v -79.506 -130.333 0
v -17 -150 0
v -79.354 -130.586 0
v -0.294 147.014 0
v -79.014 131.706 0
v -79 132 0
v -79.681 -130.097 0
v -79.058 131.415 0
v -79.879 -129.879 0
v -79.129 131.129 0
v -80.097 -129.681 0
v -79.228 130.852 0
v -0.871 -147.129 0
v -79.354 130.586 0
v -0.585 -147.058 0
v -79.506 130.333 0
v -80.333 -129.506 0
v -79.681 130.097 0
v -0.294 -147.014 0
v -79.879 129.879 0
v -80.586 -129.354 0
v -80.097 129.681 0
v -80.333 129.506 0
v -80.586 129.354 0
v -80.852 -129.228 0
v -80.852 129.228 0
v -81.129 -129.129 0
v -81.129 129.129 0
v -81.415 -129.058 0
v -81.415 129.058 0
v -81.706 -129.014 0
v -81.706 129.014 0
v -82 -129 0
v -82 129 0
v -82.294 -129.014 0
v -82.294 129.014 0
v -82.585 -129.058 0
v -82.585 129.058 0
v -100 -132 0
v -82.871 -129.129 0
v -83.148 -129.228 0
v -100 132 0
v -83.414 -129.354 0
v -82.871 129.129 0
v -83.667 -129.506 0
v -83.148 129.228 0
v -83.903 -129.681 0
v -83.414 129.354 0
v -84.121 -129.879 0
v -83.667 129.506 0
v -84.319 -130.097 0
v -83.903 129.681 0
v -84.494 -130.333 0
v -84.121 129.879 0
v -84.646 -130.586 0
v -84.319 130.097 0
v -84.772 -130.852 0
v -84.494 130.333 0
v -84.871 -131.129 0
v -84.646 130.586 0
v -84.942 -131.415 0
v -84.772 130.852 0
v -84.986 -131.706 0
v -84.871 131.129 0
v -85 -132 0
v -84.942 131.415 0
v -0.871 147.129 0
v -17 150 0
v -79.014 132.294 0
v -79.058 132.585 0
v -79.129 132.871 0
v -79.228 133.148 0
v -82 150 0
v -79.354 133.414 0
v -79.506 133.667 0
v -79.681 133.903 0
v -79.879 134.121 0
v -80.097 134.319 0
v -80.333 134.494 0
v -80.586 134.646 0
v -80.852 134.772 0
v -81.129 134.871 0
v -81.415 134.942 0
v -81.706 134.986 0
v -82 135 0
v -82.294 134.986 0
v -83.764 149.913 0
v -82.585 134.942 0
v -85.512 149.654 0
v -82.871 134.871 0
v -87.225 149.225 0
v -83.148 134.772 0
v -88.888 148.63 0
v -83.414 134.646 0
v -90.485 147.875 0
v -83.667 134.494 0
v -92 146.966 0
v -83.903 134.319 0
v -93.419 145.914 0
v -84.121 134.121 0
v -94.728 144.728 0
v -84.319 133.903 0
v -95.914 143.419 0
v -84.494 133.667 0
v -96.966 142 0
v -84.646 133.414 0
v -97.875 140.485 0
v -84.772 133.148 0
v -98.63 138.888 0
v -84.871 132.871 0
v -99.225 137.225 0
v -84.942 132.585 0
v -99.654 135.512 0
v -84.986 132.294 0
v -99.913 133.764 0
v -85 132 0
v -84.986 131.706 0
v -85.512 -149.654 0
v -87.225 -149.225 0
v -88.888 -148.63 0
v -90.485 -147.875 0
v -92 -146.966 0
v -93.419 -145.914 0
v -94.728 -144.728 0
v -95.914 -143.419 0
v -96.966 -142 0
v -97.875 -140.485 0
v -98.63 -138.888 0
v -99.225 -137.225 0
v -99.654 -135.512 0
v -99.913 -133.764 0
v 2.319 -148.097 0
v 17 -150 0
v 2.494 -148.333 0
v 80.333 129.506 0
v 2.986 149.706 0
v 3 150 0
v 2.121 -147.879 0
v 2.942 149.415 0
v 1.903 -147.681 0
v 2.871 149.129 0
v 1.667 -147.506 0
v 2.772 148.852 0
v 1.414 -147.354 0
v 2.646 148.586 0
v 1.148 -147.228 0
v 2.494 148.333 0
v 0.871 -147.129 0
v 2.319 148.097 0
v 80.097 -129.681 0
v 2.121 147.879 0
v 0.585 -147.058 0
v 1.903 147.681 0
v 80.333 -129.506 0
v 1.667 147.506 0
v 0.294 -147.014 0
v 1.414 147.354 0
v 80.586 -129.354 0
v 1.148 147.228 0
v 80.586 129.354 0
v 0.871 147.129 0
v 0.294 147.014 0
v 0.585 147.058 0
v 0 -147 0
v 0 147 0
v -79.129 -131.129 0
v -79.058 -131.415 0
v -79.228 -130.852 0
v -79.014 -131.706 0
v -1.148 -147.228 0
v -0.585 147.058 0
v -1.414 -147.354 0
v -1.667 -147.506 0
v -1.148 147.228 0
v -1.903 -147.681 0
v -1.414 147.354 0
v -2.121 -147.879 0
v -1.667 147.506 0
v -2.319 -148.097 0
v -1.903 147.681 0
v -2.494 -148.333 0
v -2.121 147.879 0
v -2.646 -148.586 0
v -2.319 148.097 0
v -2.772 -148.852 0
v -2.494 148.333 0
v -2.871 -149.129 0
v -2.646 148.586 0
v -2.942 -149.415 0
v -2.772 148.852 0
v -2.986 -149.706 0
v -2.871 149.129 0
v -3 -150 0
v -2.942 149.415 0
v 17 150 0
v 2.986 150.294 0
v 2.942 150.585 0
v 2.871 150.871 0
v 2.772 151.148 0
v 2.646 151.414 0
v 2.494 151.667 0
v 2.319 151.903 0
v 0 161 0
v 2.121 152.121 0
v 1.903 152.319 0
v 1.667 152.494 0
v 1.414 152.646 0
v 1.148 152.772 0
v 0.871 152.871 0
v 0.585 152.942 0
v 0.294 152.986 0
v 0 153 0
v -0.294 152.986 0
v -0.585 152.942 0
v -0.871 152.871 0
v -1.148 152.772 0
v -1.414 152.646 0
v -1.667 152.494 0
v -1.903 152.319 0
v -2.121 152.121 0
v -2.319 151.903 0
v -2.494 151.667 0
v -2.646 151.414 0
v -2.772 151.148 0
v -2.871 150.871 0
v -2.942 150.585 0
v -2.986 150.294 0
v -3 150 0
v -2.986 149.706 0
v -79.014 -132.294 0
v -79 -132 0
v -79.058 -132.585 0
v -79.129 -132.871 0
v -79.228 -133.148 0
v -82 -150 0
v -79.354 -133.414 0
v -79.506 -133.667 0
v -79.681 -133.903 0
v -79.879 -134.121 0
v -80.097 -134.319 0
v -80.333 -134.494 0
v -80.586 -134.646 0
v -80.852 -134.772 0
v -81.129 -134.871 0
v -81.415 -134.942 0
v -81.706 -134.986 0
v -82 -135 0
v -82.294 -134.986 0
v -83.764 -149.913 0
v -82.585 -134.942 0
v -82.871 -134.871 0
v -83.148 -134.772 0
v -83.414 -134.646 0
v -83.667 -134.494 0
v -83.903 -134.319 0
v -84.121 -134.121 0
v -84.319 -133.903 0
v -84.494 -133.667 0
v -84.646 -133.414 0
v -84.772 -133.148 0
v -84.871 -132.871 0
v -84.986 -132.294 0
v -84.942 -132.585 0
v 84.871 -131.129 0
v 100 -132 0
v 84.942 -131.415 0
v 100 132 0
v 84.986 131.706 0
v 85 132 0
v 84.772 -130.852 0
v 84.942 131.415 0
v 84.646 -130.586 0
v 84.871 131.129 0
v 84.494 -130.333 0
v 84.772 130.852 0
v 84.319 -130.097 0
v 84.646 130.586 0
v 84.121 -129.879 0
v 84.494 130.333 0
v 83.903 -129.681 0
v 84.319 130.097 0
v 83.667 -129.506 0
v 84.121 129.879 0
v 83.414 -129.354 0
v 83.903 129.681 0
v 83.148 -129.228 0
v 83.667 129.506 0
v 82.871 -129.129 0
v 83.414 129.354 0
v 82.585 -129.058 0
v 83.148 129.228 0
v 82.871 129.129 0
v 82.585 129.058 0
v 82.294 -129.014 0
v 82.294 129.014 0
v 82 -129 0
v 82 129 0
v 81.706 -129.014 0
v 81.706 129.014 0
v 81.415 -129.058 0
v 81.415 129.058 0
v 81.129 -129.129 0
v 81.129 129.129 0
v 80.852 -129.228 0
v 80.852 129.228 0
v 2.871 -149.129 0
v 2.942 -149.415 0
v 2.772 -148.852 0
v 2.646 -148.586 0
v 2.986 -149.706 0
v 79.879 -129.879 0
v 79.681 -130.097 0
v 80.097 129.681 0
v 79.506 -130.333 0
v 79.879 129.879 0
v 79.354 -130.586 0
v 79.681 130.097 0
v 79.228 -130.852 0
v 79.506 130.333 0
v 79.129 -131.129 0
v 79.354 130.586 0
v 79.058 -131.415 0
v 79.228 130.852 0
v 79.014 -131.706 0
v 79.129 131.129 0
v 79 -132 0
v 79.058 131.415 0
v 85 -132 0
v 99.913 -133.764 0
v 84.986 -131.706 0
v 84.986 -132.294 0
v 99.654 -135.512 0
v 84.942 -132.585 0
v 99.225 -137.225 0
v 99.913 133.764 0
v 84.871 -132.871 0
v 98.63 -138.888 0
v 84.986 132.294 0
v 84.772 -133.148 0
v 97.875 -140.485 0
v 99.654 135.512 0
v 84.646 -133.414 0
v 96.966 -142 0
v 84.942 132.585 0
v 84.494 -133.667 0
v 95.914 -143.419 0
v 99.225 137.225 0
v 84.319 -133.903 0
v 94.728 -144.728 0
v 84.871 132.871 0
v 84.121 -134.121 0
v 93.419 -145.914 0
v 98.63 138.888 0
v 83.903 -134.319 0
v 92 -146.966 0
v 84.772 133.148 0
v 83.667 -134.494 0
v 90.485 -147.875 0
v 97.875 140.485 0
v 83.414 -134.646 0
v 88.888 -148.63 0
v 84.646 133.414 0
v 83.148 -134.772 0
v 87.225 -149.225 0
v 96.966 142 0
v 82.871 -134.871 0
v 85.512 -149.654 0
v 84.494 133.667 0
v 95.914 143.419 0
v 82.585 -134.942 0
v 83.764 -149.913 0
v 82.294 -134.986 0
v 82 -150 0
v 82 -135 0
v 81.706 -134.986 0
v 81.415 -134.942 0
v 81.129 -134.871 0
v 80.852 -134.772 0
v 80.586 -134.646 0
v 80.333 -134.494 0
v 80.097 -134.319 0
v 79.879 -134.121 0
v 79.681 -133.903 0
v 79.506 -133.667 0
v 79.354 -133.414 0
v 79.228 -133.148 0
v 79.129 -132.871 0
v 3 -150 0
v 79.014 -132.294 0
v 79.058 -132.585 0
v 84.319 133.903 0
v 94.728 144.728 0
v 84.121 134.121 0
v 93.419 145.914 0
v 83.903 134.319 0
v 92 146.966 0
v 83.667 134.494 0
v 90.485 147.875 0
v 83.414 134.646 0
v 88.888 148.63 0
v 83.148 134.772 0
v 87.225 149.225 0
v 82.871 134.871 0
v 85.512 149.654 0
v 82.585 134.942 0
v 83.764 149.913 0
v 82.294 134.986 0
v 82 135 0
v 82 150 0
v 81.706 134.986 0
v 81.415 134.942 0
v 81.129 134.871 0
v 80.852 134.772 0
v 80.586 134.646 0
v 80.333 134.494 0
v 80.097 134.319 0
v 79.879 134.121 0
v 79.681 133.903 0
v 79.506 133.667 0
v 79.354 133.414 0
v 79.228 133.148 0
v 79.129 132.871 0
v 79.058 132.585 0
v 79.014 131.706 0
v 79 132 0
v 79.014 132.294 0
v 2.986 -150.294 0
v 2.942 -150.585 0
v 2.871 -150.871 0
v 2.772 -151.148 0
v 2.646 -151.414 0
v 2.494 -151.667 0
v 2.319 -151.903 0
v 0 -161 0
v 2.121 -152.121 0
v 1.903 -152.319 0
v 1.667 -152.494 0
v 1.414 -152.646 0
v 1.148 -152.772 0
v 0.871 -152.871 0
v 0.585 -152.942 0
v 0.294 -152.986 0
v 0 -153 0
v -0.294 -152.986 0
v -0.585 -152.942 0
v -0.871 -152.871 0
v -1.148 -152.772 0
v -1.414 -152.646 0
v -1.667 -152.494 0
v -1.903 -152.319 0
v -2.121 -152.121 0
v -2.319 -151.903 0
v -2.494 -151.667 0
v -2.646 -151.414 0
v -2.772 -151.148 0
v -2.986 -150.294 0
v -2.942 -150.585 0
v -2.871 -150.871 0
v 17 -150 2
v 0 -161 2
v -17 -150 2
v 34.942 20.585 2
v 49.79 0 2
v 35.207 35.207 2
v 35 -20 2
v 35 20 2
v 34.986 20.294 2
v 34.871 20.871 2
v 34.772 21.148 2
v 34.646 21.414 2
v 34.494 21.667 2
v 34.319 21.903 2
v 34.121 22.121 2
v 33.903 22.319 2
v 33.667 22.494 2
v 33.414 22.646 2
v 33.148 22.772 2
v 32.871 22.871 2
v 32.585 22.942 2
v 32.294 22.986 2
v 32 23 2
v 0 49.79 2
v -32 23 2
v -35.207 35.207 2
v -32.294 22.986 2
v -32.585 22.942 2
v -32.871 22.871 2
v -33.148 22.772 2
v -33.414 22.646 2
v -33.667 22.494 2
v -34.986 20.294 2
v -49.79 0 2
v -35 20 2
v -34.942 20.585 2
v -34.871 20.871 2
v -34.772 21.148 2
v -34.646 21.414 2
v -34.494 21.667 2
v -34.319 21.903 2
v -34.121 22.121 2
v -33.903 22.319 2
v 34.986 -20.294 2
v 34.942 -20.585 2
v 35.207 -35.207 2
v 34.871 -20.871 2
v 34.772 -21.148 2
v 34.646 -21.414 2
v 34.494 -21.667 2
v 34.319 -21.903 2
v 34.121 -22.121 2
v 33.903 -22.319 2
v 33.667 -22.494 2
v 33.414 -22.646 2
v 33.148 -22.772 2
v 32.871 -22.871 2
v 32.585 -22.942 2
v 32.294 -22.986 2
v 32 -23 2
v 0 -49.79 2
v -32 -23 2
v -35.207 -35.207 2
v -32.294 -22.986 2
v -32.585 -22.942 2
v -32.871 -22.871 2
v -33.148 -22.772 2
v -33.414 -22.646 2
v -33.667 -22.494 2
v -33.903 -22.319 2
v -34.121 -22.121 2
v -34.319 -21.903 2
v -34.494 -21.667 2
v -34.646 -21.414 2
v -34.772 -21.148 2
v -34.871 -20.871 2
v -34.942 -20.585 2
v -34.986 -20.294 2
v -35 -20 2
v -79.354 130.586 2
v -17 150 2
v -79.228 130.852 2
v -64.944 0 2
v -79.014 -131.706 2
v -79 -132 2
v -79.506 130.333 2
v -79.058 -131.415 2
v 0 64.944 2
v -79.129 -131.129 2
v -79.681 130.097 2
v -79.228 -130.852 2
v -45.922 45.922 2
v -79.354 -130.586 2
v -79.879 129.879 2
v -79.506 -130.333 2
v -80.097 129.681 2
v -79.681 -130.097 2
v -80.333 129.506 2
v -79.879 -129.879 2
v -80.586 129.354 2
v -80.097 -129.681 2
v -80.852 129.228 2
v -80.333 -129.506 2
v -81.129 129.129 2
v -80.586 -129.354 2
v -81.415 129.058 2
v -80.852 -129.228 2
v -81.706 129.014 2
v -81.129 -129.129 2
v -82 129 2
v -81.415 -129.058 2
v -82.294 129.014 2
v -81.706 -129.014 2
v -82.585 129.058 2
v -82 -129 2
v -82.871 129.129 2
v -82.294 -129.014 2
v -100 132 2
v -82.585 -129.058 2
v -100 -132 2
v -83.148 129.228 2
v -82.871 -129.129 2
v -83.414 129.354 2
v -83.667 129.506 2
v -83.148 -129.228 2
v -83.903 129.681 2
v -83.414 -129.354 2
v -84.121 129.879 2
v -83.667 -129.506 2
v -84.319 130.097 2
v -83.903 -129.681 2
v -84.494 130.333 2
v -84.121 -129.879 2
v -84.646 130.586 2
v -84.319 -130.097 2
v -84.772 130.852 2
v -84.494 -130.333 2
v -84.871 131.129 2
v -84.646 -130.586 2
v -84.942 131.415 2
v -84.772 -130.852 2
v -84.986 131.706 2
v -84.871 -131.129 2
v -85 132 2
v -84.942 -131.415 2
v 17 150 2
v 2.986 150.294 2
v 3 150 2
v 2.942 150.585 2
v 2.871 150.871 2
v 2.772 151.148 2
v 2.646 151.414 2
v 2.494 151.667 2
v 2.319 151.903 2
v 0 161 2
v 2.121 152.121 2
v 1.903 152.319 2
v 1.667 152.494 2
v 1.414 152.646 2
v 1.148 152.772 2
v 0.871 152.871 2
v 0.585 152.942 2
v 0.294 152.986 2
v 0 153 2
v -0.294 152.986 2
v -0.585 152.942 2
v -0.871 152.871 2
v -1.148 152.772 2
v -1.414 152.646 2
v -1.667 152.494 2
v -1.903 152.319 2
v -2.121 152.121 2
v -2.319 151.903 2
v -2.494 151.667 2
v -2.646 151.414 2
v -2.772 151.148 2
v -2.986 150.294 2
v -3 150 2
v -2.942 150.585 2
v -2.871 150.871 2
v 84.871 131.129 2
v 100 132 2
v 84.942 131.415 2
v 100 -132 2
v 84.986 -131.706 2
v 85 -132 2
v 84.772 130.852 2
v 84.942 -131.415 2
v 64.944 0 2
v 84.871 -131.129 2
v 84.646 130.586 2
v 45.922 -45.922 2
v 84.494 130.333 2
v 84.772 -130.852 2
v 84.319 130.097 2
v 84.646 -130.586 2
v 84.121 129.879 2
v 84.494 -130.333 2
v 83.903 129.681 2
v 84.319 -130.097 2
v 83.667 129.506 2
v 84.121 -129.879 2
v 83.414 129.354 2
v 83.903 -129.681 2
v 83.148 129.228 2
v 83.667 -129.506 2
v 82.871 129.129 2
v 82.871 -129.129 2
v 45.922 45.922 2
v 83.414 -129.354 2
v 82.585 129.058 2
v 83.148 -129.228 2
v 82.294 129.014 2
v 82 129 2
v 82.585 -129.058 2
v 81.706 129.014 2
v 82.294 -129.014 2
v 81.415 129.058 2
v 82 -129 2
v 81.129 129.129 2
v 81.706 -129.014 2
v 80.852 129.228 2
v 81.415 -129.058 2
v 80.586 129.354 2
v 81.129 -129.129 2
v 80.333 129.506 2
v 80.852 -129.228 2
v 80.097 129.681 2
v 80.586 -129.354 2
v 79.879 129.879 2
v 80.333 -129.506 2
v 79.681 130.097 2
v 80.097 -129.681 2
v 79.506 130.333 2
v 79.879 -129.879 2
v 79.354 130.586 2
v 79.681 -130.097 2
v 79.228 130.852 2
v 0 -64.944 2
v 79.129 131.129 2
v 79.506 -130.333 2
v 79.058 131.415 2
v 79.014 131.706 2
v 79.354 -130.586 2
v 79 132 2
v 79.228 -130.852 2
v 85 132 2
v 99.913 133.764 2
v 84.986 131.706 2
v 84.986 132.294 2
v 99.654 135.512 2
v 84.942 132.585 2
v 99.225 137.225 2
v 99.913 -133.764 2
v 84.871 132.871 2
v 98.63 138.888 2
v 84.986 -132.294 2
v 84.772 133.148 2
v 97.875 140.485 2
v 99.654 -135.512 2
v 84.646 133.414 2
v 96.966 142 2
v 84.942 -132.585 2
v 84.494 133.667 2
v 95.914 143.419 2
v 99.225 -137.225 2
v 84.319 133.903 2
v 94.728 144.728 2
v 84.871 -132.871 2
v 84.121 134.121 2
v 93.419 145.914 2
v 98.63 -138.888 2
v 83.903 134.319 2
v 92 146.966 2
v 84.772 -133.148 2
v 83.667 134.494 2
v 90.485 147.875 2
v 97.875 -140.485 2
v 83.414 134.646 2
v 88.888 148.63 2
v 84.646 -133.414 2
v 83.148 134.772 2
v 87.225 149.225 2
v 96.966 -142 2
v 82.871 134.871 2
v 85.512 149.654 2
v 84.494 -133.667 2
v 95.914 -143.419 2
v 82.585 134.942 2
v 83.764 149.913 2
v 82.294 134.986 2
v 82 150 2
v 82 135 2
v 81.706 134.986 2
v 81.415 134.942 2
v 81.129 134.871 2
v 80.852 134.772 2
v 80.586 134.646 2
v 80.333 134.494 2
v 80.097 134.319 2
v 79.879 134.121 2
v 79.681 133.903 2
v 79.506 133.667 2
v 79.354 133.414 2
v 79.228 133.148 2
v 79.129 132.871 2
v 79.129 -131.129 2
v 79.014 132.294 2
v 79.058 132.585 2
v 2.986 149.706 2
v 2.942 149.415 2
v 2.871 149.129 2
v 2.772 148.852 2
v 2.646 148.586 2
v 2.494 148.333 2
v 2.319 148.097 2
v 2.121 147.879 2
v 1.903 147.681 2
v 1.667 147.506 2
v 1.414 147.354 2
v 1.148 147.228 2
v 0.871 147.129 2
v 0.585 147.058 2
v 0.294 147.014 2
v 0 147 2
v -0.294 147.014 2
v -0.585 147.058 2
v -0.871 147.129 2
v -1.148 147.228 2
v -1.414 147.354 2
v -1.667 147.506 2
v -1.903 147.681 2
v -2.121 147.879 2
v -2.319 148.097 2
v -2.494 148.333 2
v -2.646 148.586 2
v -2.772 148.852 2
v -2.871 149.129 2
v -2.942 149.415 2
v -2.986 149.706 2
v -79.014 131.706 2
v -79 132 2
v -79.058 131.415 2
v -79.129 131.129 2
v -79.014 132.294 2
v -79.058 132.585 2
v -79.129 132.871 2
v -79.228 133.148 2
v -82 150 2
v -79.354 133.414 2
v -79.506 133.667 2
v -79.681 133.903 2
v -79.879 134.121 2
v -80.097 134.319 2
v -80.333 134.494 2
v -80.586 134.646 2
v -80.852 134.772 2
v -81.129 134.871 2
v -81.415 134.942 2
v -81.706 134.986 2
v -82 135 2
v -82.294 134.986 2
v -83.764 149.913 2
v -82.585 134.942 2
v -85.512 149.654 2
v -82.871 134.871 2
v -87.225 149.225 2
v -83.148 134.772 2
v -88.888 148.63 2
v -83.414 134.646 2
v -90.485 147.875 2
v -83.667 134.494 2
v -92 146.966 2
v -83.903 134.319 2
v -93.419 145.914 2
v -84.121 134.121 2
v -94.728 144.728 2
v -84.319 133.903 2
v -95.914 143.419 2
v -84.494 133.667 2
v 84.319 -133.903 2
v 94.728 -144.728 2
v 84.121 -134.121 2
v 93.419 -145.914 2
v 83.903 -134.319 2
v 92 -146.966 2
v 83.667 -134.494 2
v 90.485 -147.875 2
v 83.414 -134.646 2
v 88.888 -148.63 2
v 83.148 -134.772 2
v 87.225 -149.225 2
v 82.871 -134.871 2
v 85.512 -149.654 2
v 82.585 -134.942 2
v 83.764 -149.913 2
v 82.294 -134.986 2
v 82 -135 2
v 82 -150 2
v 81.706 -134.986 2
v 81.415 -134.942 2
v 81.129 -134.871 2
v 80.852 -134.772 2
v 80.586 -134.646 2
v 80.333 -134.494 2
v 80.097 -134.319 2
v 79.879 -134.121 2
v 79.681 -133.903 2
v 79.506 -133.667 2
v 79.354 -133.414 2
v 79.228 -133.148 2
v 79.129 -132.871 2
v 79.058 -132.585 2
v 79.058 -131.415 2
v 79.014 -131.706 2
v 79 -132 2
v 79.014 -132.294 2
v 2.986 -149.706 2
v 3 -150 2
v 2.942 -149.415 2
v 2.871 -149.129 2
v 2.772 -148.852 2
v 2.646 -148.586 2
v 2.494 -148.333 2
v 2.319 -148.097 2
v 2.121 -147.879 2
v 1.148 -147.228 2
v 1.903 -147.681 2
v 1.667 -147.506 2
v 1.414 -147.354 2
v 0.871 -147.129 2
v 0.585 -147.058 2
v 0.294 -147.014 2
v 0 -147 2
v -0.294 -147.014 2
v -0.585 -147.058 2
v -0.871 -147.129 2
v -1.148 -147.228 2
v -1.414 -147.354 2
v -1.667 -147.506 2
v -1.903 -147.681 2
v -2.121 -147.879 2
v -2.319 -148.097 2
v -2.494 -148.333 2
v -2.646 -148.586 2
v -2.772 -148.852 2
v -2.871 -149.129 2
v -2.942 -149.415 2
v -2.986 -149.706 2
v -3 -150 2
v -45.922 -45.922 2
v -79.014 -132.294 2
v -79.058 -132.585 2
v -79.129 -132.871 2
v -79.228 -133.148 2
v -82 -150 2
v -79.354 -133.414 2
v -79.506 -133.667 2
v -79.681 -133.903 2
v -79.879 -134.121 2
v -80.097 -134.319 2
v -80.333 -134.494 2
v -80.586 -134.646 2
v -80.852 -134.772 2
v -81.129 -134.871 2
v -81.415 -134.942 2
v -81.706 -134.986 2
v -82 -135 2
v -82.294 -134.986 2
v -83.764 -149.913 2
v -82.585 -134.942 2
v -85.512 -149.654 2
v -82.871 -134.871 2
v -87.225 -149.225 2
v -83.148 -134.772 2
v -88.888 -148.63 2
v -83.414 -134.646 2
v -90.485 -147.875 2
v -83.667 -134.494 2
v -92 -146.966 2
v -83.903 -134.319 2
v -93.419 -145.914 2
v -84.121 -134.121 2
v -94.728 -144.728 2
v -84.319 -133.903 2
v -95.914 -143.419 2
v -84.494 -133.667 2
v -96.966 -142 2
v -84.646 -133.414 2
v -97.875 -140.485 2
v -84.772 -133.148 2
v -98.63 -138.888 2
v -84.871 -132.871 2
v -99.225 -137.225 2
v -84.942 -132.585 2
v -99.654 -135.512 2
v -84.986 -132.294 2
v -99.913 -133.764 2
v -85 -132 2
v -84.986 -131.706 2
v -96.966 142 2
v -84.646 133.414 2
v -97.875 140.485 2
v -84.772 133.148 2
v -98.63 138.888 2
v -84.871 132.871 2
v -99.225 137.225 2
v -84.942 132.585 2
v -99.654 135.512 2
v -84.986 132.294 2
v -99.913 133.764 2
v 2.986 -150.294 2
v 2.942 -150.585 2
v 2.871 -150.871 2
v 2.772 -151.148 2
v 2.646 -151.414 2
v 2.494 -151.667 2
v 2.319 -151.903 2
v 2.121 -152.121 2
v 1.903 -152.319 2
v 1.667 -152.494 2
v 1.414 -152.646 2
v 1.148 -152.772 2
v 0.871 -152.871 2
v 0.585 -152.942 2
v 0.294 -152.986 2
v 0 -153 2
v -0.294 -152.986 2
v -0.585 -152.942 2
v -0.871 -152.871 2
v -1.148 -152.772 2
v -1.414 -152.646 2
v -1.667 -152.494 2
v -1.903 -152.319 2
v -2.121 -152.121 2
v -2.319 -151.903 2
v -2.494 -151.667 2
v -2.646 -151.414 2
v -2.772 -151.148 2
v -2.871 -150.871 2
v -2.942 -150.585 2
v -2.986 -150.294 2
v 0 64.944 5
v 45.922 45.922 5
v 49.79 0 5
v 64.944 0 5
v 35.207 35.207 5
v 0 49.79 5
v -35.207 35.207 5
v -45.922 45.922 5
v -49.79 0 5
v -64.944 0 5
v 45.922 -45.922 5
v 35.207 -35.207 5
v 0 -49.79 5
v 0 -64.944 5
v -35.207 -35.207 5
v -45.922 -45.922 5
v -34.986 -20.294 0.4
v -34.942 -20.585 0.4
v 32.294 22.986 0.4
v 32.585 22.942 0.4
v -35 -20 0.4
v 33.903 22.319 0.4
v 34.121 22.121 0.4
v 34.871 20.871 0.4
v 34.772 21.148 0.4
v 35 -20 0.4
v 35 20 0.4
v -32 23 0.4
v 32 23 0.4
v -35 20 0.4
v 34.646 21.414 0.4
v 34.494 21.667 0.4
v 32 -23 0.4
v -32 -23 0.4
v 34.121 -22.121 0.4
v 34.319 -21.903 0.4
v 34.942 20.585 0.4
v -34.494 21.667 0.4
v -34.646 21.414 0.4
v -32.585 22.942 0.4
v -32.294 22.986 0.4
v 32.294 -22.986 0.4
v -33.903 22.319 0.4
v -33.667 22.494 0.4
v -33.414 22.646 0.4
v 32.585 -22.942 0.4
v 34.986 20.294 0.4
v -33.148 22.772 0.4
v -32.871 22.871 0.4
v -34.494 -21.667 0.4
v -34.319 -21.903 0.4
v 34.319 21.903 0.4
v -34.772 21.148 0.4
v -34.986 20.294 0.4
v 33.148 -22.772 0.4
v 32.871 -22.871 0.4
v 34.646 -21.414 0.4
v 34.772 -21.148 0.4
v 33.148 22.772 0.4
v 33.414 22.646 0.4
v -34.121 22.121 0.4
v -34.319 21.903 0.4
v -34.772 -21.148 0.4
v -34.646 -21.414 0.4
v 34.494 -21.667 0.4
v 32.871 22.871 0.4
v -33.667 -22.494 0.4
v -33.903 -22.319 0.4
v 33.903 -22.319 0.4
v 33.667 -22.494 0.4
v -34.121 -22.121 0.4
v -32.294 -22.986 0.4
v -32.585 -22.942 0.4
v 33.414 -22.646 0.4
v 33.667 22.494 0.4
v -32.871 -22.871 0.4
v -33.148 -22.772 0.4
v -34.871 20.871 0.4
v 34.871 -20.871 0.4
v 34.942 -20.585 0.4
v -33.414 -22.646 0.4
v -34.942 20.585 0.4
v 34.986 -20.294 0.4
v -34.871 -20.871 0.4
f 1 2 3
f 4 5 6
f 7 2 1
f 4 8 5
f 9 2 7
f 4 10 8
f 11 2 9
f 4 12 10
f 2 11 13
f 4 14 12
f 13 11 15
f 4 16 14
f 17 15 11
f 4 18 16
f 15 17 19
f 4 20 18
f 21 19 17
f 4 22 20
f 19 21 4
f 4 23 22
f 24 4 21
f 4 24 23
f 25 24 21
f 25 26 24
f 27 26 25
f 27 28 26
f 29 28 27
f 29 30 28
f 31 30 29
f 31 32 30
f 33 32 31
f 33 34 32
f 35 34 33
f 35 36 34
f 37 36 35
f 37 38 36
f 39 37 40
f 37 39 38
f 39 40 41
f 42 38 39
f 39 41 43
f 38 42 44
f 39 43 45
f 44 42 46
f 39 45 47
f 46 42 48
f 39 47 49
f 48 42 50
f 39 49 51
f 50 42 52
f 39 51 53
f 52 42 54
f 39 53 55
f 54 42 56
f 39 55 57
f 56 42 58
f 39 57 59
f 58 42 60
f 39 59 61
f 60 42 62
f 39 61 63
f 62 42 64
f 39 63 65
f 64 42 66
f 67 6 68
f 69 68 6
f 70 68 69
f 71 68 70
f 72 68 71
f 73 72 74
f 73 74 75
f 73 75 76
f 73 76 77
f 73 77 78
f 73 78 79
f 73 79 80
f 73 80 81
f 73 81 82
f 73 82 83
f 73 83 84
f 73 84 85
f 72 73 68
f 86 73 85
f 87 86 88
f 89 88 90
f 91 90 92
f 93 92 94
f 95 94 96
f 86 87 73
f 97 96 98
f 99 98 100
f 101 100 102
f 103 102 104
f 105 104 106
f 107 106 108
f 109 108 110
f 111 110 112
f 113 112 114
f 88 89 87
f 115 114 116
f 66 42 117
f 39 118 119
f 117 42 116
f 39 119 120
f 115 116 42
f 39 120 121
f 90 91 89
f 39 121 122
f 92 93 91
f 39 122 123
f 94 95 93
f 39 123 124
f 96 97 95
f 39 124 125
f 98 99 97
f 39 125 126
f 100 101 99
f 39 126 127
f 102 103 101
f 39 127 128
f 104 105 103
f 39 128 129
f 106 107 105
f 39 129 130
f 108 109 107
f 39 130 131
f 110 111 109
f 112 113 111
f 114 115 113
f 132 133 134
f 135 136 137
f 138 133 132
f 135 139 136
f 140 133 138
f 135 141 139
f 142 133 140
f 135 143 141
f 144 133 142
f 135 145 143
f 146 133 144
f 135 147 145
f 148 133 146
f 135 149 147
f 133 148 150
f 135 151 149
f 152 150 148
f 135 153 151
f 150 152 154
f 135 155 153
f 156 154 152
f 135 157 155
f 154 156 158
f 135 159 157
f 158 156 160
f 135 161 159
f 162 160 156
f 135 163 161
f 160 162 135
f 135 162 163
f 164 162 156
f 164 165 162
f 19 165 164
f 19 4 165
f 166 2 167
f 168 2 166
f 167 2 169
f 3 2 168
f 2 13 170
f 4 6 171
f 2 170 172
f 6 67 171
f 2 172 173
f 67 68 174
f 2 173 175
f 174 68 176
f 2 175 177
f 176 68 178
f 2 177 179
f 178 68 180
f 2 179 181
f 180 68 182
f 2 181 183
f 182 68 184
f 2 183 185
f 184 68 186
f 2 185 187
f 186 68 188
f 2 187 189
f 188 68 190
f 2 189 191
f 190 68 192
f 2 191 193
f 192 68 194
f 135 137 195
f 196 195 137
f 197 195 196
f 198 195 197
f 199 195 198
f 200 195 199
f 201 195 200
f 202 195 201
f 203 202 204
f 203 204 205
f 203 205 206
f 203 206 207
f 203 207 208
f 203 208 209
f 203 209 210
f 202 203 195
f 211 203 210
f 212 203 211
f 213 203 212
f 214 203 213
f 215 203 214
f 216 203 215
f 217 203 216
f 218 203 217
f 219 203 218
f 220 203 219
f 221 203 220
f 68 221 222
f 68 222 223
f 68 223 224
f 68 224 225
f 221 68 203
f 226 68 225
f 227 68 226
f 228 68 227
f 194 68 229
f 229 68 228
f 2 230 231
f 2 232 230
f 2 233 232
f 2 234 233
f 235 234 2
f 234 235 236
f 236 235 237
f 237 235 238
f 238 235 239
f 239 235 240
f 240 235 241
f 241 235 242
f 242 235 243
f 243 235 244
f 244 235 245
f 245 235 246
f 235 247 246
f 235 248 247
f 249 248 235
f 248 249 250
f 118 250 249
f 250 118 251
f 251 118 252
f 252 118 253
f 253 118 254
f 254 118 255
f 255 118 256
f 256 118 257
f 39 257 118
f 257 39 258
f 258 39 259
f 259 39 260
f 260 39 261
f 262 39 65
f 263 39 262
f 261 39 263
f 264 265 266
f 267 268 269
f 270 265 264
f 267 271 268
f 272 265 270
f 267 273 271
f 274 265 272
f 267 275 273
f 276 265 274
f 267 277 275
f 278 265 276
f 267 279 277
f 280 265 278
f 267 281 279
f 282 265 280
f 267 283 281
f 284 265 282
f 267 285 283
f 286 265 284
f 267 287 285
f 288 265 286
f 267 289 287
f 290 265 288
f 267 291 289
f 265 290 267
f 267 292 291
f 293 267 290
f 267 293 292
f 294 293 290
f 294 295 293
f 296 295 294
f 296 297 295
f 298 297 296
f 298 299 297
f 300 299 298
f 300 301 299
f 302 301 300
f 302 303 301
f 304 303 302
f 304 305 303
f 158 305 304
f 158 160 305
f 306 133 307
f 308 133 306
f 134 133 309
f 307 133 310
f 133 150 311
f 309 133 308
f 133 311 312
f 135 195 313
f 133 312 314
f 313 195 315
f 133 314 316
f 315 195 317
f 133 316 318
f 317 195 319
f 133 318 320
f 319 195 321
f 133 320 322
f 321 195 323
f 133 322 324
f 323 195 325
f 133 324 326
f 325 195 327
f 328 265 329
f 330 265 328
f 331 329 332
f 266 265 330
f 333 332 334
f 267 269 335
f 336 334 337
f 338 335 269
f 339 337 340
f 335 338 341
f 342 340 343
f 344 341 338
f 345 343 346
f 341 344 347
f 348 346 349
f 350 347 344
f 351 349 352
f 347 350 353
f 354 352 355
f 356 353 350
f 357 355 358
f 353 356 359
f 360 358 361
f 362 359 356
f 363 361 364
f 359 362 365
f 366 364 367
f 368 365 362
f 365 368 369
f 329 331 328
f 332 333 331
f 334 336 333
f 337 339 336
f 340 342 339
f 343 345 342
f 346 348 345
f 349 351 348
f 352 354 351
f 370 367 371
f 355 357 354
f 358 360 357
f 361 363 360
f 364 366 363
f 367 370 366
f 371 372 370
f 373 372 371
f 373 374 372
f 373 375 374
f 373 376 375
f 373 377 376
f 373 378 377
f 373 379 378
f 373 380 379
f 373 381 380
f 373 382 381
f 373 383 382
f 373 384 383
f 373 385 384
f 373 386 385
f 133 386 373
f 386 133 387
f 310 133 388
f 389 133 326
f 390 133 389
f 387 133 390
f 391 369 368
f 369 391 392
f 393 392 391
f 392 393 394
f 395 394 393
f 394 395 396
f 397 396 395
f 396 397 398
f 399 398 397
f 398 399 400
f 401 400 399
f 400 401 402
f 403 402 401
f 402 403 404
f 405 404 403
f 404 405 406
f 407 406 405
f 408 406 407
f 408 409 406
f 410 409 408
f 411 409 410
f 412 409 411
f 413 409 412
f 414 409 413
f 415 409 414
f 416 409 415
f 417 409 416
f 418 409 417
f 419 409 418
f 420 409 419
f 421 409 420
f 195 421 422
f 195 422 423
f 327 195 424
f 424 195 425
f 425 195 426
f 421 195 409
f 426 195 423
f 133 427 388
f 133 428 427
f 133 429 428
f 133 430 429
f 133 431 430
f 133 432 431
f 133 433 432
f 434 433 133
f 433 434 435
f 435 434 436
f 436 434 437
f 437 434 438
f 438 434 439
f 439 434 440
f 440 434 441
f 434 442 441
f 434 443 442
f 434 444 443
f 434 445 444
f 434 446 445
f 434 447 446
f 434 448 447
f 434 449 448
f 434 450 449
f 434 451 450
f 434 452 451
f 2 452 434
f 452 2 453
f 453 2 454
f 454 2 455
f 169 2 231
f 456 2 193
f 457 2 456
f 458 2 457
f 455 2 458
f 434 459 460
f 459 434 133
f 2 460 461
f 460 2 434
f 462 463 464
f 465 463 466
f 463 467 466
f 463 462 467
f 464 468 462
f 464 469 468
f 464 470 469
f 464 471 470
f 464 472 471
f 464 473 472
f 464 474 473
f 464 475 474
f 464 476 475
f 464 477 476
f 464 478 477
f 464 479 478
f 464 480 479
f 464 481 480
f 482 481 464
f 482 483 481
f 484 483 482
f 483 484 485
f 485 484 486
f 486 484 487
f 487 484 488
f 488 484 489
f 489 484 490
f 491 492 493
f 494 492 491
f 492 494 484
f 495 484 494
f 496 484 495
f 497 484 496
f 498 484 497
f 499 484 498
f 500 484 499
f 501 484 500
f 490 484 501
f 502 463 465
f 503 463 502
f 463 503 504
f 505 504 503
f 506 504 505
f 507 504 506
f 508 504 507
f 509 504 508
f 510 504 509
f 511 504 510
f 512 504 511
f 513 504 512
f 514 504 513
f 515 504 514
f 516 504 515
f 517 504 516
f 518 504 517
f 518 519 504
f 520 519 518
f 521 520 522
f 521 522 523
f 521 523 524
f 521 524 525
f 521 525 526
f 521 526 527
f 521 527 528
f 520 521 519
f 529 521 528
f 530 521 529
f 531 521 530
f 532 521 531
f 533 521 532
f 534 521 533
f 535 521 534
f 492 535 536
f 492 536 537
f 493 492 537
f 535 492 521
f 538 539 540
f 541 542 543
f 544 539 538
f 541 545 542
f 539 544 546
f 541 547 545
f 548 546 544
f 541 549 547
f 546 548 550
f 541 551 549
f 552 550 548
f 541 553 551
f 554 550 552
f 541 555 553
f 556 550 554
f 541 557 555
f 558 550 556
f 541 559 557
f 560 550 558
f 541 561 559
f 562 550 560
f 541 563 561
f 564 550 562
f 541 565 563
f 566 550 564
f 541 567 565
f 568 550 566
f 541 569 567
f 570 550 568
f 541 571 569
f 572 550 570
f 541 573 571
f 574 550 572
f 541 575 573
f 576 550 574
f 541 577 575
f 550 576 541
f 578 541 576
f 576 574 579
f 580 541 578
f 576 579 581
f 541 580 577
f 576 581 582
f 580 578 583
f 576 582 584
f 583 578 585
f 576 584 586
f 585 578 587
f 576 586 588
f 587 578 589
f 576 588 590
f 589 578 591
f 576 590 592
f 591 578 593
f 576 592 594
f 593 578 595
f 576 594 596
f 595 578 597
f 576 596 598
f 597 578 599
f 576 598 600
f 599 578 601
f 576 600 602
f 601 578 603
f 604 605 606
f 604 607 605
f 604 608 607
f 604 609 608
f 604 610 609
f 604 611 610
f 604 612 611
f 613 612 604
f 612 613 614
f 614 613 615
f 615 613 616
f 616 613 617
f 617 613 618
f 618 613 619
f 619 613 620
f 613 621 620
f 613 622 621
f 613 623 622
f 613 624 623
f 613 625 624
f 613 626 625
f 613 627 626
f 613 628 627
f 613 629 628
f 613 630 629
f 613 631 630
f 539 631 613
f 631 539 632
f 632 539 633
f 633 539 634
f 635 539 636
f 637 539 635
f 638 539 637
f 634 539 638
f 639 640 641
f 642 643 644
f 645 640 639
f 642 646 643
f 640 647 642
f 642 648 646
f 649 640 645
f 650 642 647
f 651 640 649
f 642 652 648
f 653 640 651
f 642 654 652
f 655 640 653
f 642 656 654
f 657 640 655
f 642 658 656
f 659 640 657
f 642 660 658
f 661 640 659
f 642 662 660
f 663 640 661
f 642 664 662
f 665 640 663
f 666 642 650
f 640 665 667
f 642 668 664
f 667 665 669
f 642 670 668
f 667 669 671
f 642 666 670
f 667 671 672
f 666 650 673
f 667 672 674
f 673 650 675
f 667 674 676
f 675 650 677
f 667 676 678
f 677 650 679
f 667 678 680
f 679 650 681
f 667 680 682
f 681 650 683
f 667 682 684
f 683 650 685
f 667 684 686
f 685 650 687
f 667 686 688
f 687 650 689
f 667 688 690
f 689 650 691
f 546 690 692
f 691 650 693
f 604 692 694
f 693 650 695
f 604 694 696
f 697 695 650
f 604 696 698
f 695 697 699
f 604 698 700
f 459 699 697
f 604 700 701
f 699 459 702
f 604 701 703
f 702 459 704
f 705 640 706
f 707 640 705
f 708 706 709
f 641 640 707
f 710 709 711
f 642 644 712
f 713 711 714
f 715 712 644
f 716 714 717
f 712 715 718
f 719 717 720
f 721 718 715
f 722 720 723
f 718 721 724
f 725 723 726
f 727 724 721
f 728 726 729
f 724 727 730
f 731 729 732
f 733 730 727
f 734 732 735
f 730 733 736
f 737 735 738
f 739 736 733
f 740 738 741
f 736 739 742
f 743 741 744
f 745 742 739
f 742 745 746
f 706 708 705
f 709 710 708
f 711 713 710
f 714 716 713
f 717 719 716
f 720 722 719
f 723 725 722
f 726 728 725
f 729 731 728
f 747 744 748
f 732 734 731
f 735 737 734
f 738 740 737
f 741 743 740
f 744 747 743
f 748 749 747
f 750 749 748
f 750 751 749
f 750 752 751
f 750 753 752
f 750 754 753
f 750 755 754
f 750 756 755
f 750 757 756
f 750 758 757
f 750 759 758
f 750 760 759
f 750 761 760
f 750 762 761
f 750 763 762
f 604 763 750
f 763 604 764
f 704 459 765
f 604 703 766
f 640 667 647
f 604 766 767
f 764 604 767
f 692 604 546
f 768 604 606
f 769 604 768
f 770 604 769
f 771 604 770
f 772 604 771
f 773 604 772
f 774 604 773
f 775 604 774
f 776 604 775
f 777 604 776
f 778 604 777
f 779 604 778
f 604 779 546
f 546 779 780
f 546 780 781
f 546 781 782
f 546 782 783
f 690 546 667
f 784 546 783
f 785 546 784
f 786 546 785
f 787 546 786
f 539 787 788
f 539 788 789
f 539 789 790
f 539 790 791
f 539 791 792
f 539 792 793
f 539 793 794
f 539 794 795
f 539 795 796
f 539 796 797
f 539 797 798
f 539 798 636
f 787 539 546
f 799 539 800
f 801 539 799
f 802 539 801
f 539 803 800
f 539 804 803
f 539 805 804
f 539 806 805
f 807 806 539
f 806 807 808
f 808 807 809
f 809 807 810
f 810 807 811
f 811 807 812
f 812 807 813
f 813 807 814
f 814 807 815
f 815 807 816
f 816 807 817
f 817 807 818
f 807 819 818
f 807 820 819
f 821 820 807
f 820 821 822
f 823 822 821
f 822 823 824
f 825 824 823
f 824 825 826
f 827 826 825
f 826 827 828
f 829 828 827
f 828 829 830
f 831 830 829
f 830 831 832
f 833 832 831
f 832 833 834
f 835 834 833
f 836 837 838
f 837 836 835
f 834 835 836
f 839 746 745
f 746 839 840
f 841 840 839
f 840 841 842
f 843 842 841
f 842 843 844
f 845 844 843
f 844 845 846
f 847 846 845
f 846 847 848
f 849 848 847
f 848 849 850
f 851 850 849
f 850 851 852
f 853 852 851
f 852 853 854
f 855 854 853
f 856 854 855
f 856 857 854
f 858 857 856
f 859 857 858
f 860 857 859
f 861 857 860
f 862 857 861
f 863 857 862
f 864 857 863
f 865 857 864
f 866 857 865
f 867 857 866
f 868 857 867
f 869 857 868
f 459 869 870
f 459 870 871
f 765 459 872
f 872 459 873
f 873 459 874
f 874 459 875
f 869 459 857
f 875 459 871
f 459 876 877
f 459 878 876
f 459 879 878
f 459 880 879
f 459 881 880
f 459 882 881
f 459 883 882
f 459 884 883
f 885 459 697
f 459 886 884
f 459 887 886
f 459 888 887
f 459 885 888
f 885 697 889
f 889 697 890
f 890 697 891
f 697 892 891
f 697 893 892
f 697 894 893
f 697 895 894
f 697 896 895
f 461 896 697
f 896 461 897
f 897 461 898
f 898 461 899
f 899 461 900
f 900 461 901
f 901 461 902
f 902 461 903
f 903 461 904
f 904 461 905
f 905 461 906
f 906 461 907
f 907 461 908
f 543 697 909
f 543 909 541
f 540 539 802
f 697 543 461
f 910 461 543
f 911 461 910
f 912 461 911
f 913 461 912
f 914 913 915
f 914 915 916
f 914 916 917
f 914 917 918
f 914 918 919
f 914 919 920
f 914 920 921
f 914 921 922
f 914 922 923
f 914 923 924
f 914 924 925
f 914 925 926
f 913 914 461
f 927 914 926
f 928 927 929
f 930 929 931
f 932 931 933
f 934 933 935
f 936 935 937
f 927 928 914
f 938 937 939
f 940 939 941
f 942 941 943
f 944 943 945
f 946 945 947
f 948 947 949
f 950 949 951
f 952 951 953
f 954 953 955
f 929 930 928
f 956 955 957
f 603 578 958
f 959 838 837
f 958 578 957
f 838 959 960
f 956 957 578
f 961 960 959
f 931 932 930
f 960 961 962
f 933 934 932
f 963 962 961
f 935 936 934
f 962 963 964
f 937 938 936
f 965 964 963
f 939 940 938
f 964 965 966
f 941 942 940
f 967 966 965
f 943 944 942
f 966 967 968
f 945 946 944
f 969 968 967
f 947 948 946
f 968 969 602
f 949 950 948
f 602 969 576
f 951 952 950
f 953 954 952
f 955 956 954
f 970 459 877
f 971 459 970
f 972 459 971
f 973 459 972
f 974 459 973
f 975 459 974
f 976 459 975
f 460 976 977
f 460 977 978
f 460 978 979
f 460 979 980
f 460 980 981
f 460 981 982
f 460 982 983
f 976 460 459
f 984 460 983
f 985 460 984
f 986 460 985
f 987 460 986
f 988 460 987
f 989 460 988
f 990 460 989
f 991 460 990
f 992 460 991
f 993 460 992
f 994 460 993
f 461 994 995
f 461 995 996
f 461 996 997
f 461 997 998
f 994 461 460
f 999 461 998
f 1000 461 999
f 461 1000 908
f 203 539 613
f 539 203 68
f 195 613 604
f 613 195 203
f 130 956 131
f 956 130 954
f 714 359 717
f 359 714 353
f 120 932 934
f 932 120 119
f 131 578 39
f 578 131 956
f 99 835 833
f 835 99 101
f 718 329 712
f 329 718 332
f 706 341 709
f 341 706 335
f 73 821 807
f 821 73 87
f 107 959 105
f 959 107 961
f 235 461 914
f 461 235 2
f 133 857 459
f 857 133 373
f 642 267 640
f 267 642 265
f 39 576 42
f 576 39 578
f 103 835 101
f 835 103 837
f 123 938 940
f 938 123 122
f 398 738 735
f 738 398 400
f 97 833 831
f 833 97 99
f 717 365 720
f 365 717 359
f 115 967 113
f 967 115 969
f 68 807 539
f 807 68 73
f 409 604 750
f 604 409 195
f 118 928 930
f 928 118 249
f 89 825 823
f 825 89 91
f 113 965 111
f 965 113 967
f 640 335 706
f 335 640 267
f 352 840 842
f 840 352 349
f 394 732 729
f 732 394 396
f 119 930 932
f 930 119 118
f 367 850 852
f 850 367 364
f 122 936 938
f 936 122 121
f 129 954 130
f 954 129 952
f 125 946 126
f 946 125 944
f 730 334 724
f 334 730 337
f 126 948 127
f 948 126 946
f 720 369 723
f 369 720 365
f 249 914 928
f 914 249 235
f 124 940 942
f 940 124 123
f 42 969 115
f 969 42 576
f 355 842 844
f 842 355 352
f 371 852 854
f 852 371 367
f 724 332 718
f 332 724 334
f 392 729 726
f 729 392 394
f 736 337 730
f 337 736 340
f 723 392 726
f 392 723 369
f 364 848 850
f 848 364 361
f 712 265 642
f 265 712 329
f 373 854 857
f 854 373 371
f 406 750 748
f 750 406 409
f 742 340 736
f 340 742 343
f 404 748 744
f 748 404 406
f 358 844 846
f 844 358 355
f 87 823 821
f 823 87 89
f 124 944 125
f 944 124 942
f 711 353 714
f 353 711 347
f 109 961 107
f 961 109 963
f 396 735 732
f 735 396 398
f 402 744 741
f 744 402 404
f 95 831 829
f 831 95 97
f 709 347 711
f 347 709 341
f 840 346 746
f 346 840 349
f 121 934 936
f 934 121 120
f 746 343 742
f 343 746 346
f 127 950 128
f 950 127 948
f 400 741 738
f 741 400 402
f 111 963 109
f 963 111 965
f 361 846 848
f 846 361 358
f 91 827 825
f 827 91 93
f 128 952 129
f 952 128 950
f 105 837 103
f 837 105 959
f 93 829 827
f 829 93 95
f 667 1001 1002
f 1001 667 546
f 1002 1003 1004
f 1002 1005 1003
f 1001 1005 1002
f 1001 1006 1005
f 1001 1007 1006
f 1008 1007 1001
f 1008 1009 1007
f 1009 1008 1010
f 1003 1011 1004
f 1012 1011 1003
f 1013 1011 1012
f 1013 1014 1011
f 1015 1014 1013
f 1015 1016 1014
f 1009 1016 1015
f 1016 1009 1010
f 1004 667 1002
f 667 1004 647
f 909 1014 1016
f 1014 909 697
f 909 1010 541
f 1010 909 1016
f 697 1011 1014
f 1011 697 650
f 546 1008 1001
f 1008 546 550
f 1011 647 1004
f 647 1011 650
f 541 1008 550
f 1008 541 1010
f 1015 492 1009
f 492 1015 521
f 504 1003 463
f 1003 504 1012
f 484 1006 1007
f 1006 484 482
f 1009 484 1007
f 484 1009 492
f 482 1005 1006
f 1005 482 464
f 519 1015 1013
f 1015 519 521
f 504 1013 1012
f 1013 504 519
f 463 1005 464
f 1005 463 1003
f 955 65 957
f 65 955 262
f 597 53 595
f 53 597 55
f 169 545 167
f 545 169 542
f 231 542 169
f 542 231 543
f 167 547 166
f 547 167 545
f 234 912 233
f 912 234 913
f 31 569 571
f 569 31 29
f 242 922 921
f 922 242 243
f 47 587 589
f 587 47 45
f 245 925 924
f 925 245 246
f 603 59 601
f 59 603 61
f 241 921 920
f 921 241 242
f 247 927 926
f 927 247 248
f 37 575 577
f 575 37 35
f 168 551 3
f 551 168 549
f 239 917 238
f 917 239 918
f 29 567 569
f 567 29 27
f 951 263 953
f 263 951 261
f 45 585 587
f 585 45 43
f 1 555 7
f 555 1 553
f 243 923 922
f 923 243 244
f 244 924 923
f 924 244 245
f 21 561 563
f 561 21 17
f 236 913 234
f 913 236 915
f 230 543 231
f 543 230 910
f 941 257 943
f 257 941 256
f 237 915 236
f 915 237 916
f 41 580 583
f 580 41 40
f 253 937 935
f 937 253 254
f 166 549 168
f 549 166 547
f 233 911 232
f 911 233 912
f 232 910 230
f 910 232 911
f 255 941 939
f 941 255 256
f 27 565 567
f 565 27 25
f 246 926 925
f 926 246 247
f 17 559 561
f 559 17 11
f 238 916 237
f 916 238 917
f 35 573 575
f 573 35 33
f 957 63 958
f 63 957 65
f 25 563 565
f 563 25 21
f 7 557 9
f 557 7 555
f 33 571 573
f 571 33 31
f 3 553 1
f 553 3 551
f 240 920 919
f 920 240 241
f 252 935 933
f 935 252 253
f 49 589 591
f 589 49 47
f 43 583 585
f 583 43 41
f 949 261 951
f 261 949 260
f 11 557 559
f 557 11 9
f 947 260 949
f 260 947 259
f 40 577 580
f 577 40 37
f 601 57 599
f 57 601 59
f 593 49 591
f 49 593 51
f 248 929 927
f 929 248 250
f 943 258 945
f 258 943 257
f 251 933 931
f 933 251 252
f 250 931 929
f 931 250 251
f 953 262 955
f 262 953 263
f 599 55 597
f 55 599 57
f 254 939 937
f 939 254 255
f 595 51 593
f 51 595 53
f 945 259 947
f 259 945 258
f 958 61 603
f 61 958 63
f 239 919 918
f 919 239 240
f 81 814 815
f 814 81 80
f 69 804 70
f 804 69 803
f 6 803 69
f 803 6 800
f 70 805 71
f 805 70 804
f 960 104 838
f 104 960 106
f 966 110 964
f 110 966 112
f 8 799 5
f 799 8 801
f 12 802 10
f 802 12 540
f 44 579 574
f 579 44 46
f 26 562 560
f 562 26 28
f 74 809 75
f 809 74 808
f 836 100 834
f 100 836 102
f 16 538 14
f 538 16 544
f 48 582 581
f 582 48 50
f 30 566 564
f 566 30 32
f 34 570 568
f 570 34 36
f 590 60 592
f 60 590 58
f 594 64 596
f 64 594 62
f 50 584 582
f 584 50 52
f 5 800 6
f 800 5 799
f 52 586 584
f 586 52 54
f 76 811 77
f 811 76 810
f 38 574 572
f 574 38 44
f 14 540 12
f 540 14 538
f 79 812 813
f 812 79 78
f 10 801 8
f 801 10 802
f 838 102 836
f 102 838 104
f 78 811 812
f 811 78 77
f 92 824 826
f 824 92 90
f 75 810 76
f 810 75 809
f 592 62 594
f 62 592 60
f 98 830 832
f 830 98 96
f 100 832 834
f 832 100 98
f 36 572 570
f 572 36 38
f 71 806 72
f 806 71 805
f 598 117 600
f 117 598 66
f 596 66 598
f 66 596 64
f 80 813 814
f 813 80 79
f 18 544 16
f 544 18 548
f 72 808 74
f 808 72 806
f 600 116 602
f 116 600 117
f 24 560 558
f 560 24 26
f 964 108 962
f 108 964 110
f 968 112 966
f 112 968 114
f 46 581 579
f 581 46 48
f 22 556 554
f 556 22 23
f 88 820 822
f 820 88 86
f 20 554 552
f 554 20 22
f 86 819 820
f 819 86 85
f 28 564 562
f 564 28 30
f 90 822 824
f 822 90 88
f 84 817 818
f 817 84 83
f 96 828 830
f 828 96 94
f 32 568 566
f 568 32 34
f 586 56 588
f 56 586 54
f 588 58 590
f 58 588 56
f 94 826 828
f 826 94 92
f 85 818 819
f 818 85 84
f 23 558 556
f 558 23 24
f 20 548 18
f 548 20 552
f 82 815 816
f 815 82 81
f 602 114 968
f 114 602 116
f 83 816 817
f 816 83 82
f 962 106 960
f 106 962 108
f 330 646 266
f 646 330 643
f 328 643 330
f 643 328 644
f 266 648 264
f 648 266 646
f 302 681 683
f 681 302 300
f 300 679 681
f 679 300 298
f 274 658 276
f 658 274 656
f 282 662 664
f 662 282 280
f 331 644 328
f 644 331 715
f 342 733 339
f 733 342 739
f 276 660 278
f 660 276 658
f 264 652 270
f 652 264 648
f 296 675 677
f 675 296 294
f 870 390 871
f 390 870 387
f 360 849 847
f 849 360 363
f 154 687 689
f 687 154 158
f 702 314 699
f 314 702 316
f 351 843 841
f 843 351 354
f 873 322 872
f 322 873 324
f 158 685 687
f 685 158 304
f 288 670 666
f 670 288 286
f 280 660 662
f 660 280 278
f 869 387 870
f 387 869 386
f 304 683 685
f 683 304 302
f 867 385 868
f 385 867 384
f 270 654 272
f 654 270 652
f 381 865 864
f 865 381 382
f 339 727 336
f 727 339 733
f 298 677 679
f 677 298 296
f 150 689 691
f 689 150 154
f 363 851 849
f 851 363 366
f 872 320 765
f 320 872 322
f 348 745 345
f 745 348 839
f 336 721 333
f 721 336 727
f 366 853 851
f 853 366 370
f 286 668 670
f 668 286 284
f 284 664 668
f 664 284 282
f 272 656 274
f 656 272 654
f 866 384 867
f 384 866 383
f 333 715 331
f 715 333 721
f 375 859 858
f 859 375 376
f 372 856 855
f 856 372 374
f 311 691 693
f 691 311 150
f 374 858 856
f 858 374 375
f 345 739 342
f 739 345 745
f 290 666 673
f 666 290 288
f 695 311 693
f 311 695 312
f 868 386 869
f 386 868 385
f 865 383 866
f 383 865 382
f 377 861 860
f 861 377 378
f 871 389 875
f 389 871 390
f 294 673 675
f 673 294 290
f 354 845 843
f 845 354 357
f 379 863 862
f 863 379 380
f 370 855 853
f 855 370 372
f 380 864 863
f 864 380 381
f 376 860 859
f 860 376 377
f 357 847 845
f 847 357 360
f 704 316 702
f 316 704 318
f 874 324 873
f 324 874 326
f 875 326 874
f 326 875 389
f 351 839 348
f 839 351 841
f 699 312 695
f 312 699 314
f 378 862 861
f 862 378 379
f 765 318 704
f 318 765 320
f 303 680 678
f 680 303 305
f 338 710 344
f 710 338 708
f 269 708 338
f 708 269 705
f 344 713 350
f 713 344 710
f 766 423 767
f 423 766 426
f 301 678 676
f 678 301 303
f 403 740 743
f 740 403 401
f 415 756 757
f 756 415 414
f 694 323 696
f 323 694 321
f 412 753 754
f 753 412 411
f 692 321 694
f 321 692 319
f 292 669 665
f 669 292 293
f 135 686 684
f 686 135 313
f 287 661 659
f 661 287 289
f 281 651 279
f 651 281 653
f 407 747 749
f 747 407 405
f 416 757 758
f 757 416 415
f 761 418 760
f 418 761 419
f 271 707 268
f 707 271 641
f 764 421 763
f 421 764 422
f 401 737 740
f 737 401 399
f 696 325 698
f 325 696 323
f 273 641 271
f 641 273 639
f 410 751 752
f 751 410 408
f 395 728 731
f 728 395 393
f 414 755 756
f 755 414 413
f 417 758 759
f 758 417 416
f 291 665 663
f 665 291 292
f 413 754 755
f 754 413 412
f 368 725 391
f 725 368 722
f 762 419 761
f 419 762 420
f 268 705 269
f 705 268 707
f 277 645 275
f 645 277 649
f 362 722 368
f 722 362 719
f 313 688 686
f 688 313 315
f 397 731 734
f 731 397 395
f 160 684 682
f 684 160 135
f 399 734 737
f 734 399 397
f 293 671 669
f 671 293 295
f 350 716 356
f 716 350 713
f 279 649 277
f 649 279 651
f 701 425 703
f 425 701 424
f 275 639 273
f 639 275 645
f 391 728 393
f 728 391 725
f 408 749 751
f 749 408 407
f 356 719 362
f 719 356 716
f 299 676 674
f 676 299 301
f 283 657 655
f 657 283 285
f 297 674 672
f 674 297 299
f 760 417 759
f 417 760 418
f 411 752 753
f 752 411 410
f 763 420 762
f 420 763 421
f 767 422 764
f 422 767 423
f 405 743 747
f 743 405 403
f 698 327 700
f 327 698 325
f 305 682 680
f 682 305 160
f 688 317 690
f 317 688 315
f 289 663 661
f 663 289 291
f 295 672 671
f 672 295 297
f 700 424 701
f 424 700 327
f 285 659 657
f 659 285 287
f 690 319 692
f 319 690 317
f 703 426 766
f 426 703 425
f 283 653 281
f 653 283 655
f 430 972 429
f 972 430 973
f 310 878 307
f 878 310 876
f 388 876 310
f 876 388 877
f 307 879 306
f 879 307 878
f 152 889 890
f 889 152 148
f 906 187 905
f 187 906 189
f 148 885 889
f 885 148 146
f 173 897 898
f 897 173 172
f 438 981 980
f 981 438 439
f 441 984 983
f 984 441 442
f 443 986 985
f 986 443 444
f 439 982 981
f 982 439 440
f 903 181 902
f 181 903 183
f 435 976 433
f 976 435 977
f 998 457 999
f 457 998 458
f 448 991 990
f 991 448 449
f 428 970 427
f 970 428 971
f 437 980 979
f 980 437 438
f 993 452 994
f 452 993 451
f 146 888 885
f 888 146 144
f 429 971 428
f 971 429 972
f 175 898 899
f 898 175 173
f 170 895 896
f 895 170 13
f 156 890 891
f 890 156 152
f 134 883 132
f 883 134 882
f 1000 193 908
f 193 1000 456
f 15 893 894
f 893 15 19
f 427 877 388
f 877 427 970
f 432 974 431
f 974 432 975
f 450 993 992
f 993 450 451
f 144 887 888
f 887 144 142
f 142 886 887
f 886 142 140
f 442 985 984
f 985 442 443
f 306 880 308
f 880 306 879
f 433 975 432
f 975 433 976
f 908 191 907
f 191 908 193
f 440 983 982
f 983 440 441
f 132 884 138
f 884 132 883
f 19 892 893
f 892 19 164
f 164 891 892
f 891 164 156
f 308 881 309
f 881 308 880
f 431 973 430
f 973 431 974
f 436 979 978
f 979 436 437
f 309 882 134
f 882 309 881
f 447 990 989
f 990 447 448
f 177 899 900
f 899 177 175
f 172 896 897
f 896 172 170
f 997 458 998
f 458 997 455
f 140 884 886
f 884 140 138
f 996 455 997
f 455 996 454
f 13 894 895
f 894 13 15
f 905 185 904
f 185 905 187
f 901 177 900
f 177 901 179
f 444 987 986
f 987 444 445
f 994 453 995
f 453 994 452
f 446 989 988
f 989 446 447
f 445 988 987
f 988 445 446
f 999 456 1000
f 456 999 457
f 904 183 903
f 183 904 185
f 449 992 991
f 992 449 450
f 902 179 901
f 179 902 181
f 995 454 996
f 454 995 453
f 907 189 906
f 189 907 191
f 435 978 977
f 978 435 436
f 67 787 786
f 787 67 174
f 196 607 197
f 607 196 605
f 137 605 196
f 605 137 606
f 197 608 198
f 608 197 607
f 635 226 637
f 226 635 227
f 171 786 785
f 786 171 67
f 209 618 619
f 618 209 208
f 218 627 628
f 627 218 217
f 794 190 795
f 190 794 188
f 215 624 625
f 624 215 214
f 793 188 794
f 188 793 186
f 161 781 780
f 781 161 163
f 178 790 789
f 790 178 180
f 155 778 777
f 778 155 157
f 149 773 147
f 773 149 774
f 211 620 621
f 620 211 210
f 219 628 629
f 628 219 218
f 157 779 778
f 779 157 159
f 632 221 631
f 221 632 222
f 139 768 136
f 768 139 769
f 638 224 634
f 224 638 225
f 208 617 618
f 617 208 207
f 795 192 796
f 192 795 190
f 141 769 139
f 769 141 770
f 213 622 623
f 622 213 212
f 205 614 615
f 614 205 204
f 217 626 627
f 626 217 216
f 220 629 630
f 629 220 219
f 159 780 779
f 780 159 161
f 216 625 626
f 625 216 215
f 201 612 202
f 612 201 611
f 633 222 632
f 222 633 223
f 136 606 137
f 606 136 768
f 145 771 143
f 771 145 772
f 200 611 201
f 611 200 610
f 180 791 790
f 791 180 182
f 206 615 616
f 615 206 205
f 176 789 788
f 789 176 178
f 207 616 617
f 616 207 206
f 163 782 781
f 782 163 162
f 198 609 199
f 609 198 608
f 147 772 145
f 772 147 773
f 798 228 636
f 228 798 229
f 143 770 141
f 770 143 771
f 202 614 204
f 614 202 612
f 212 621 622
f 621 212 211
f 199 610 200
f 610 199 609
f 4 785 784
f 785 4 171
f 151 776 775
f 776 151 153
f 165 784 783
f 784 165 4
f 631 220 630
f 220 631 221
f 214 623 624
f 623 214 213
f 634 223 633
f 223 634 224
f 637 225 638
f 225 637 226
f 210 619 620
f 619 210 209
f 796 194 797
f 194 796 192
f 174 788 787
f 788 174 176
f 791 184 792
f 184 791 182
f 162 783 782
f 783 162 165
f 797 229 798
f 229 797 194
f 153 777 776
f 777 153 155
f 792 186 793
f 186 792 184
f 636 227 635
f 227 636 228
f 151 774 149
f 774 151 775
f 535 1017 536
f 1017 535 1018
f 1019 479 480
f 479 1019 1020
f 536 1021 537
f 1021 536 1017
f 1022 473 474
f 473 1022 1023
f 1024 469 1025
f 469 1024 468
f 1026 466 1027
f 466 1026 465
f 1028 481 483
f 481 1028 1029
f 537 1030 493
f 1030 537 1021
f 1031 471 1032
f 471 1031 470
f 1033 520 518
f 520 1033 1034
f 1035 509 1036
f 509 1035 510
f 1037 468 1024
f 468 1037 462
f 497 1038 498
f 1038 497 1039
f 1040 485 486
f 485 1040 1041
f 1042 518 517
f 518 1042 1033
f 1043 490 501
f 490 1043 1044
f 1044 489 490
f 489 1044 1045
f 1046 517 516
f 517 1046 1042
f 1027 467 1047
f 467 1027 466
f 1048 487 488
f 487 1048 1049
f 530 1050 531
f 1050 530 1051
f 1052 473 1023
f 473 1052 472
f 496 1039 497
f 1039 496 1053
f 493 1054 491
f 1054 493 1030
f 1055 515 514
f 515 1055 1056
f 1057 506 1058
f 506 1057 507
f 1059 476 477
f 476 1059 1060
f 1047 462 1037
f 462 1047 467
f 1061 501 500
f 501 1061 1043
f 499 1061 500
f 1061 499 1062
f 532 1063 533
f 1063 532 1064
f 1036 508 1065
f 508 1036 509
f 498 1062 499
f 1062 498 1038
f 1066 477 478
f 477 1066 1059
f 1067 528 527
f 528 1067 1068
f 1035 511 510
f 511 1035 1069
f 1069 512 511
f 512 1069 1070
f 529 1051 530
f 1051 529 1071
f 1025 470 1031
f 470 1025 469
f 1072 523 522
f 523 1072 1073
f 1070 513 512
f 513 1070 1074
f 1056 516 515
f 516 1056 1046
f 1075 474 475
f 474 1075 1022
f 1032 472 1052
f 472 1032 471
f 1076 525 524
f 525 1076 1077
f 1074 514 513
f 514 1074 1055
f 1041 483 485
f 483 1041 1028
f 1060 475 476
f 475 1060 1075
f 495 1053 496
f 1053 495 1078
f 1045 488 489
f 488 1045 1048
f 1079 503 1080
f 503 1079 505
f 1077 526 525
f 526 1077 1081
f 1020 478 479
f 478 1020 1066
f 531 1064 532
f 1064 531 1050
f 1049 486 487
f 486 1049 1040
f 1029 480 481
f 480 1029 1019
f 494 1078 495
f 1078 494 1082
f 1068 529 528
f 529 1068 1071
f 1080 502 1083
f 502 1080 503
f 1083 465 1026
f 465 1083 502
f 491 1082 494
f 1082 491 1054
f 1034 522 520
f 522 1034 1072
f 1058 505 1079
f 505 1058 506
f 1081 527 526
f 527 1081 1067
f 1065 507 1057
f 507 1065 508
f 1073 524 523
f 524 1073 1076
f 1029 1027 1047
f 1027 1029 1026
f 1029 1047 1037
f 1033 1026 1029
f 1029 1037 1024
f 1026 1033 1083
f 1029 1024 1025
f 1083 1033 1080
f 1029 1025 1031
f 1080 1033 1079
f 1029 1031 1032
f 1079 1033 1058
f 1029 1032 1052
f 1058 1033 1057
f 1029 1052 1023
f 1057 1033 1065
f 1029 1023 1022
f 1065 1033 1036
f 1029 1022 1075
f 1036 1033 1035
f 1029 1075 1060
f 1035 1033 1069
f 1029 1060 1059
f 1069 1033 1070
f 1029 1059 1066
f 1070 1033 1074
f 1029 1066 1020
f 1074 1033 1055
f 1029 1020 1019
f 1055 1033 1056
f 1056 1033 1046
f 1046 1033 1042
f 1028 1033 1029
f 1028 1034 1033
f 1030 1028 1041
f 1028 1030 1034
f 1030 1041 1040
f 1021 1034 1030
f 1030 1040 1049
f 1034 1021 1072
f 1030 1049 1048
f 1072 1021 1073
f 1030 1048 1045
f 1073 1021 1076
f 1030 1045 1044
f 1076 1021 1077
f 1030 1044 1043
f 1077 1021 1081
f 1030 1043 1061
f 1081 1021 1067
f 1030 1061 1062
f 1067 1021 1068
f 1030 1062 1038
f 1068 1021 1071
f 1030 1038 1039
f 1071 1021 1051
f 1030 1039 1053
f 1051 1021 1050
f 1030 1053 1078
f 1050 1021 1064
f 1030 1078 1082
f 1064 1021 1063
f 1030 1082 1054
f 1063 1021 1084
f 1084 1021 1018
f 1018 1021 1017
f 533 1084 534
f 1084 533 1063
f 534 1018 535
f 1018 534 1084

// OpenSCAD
$fn=64;

plate_x = 200;
plate_y = 300;
plate_t = 2.0;

corner_r = 18;

corner_hole_d = 6.0;
corner_hole_inset = 18;

tab_len = 34;
tab_wid = 22;
tab_t = plate_t;
tab_hole_d = 6.0;

bezel_h = 3.0;
bezel_outer_flat = 120;
bezel_inner_flat = 92;

pocket_x = 70;
pocket_y = 46;
pocket_depth = 1.6;
pocket_r = 3;

module rounded_rect_2d(x,y,r){
    hull(){
        translate([ x/2 - r,  y/2 - r]) circle(r=r);
        translate([-x/2 + r,  y/2 - r]) circle(r=r);
        translate([-x/2 + r, -y/2 + r]) circle(r=r);
        translate([ x/2 - r, -y/2 + r]) circle(r=r);
    }
}

module diamond_2d(len,wid){
    polygon(points=[
        [ len/2, 0],
        [ 0, wid/2],
        [-len/2, 0],
        [ 0,-wid/2]
    ]);
}

module octagon_2d(flat){
    r = flat/(2*cos(180/8));
    circle(r=r, $fn=8);
}

module plate_base(){
    linear_extrude(height=plate_t)
        rounded_rect_2d(plate_x, plate_y, corner_r);
}

module corner_holes(){
    for (sx=[-1,1], sy=[-1,1]){
        translate([sx*(plate_x/2 - corner_hole_inset), sy*(plate_y/2 - corner_hole_inset), -1])
            cylinder(h=plate_t+bezel_h+4, d=corner_hole_d);
    }
}

module tabs(){
    for (sy=[-1,1]){
        translate([0, sy*(plate_y/2), 0])
            linear_extrude(height=tab_t)
                diamond_2d(tab_len, tab_wid);
    }
}

module tab_holes(){
    for (sy=[-1,1]){
        translate([0, sy*(plate_y/2), -1])
            cylinder(h=plate_t+bezel_h+4, d=tab_hole_d);
    }
}

module bezel(){
    difference(){
        translate([0,0,plate_t])
            linear_extrude(height=bezel_h)
                octagon_2d(bezel_outer_flat);
        translate([0,0,plate_t-0.2])
            linear_extrude(height=bezel_h+0.4)
                octagon_2d(bezel_inner_flat);
    }
}

module pocket(){
    translate([0,0,plate_t - pocket_depth])
        linear_extrude(height=pocket_depth+0.2)
            rounded_rect_2d(pocket_x, pocket_y, pocket_r);
}

difference(){
    union(){
        union(){
            plate_base();
            tabs();
        }
        bezel();
    }
    corner_holes();
    tab_holes();
    pocket();
}
